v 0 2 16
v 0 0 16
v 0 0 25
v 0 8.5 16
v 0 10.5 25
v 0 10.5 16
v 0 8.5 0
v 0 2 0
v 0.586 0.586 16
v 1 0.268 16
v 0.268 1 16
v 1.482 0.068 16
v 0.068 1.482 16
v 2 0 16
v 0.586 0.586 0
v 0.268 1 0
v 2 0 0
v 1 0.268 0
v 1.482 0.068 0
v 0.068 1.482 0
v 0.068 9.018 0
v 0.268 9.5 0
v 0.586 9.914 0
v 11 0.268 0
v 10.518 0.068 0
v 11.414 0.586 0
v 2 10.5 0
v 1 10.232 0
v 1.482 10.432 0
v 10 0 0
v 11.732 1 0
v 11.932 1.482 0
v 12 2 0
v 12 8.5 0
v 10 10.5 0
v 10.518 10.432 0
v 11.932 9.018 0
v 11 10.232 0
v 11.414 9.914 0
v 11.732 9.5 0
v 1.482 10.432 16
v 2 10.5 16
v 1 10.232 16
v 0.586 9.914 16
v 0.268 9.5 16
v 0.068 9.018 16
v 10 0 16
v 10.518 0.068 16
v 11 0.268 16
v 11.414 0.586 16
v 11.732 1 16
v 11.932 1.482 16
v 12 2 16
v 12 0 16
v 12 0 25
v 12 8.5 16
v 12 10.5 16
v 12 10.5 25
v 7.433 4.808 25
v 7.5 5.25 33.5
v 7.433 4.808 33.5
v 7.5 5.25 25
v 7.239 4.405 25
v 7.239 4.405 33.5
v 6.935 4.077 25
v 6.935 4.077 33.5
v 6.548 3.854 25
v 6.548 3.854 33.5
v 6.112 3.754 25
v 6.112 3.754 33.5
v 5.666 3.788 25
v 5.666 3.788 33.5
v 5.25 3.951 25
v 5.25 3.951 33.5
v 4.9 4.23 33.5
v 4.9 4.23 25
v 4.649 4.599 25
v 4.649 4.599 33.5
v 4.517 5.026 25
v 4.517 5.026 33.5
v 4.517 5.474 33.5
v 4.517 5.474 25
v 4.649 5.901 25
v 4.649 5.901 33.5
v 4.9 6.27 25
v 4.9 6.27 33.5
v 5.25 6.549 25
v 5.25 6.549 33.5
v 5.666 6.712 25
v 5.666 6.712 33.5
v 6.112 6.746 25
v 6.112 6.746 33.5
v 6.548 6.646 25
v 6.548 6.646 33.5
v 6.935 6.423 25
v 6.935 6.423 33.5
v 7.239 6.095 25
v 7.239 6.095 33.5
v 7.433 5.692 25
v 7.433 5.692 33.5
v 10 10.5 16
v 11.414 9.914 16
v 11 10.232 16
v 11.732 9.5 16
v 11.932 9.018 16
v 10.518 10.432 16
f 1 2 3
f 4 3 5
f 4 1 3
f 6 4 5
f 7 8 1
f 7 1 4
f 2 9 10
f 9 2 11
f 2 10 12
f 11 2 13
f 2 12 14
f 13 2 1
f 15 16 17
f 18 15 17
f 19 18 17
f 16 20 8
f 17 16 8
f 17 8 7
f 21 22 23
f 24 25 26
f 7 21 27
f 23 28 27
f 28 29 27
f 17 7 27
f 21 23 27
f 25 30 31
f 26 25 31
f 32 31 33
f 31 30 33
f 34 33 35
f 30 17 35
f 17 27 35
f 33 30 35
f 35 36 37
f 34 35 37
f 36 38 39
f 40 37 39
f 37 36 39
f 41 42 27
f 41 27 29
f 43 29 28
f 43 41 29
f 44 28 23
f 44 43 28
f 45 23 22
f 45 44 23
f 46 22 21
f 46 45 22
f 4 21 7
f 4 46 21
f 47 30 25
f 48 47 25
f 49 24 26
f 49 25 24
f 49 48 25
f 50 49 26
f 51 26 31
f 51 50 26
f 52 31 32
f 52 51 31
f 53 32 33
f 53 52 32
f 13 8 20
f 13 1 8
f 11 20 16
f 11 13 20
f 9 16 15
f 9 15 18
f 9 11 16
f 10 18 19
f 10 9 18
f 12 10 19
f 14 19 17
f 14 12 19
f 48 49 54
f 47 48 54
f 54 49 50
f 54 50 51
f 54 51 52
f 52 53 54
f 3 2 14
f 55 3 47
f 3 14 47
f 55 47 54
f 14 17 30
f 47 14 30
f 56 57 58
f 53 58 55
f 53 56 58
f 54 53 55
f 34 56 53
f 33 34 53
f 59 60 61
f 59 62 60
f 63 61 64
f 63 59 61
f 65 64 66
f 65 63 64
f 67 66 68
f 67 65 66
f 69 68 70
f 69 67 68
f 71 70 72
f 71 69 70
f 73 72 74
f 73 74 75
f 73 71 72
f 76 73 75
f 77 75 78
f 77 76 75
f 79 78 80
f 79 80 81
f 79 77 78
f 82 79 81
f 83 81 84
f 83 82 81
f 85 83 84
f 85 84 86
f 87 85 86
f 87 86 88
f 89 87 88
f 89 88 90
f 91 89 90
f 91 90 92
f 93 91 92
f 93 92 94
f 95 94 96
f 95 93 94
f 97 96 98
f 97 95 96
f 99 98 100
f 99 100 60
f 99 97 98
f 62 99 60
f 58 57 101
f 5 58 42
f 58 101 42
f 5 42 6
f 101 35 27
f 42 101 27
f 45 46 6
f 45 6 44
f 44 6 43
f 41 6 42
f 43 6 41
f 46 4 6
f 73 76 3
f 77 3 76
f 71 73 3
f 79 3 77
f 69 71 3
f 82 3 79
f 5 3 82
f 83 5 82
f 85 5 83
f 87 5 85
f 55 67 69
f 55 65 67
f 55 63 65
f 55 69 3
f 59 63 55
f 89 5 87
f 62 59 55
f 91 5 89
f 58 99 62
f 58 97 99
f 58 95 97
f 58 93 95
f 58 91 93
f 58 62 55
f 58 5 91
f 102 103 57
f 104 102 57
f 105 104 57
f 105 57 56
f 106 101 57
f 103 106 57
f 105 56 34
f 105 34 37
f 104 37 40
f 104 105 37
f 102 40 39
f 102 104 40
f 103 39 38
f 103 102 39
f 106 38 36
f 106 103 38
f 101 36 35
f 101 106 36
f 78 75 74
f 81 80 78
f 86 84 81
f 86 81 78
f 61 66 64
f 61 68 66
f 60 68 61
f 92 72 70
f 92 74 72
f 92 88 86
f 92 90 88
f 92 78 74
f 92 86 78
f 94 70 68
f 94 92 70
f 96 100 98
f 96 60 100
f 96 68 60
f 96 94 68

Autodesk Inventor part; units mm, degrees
ref_plane "YZ Plane" through (0, 0, 0) normal (1, 0, 0) x (0, 1, 0)
ref_plane "XZ Plane" through (0, 0, 0) normal (0, 1, 0) x (-1, 0, 0)
ref_plane "XY Plane" through (0, 0, 0) normal (0, 0, 1) x (1, 0, 0)
sketch "Sketch1" plane through (0, 0, 0) normal (0, 0, 1) x (1, 0, 0)
  line L0 (0, 0) -> (12, 0)
  line L1 (12, 0) -> (12, 10.5)
  line L2 (12, 10.5) -> (0, 10.5)
  line L3 (0, 10.5) -> (0, 0)
  dimension "d0" = 12
  dimension "d2" = 10.5
extrude "Extrusion1" add sketch "Sketch1" along normal blind 16
fillet "Fillet1" radius 2 4 edges at (12, 10.5, 8) (0, 10.5, 8) (12, 0, 8) (0, 0, 8)
sketch "Sketch2" plane through (0, 0, 16) normal (0, 0, 1) x (1, 0, 0)
  line L0 (12, 2) -> (12, 8.5) projected
  line L1 (10, 10.5) -> (2, 10.5) projected
  line L2 (0, 8.5) -> (0, 2) projected
  line L3 (2, 0) -> (10, 0) projected
  arc A0 (12, 8.5) -> (10, 10.5) centre (10, 8.5) ccw projected
  line L4 (12, 8.5) -> (12, 10.5)
  line L5 (12, 10.5) -> (10, 10.5)
  line L6 (2, 10.5) -> (0, 10.5)
  line L7 (0, 10.5) -> (0, 8.5)
  arc A1 (0, 2) -> (2, 0) centre (2, 2) ccw projected
  line L8 (2, 0) -> (0, 0)
  line L9 (0, 0) -> (2, 0)
  line L10 (12, 2) -> (12, 0)
  arc A2 (10, 0) -> (12, 2) centre (10, 2) ccw projected
  line L11 (12, 0) -> (10, 0)
  line L12 (0, 0) -> (0, 2)
extrude "Extrusion2" add sketch "Sketch2" along normal blind 9
sketch "Sketch3" plane through (0, 0, 25) normal (0, 0, 1) x (1, 0, 0)
  line L0 (10, 10.5) -> (2, 10.5) projected
  line L1 (6, 10.5) -> (6, 0)
  line L2 (2, 0) -> (10, 0) projected
  circle A0 centre (6, 5.25) radius 1.5
  point P0 (0, 0)
  dimension "d8" = 3
extrude "Extrusion3" add sketch "Sketch3" along normal blind 8.5
properties part number "MicroMotor"
